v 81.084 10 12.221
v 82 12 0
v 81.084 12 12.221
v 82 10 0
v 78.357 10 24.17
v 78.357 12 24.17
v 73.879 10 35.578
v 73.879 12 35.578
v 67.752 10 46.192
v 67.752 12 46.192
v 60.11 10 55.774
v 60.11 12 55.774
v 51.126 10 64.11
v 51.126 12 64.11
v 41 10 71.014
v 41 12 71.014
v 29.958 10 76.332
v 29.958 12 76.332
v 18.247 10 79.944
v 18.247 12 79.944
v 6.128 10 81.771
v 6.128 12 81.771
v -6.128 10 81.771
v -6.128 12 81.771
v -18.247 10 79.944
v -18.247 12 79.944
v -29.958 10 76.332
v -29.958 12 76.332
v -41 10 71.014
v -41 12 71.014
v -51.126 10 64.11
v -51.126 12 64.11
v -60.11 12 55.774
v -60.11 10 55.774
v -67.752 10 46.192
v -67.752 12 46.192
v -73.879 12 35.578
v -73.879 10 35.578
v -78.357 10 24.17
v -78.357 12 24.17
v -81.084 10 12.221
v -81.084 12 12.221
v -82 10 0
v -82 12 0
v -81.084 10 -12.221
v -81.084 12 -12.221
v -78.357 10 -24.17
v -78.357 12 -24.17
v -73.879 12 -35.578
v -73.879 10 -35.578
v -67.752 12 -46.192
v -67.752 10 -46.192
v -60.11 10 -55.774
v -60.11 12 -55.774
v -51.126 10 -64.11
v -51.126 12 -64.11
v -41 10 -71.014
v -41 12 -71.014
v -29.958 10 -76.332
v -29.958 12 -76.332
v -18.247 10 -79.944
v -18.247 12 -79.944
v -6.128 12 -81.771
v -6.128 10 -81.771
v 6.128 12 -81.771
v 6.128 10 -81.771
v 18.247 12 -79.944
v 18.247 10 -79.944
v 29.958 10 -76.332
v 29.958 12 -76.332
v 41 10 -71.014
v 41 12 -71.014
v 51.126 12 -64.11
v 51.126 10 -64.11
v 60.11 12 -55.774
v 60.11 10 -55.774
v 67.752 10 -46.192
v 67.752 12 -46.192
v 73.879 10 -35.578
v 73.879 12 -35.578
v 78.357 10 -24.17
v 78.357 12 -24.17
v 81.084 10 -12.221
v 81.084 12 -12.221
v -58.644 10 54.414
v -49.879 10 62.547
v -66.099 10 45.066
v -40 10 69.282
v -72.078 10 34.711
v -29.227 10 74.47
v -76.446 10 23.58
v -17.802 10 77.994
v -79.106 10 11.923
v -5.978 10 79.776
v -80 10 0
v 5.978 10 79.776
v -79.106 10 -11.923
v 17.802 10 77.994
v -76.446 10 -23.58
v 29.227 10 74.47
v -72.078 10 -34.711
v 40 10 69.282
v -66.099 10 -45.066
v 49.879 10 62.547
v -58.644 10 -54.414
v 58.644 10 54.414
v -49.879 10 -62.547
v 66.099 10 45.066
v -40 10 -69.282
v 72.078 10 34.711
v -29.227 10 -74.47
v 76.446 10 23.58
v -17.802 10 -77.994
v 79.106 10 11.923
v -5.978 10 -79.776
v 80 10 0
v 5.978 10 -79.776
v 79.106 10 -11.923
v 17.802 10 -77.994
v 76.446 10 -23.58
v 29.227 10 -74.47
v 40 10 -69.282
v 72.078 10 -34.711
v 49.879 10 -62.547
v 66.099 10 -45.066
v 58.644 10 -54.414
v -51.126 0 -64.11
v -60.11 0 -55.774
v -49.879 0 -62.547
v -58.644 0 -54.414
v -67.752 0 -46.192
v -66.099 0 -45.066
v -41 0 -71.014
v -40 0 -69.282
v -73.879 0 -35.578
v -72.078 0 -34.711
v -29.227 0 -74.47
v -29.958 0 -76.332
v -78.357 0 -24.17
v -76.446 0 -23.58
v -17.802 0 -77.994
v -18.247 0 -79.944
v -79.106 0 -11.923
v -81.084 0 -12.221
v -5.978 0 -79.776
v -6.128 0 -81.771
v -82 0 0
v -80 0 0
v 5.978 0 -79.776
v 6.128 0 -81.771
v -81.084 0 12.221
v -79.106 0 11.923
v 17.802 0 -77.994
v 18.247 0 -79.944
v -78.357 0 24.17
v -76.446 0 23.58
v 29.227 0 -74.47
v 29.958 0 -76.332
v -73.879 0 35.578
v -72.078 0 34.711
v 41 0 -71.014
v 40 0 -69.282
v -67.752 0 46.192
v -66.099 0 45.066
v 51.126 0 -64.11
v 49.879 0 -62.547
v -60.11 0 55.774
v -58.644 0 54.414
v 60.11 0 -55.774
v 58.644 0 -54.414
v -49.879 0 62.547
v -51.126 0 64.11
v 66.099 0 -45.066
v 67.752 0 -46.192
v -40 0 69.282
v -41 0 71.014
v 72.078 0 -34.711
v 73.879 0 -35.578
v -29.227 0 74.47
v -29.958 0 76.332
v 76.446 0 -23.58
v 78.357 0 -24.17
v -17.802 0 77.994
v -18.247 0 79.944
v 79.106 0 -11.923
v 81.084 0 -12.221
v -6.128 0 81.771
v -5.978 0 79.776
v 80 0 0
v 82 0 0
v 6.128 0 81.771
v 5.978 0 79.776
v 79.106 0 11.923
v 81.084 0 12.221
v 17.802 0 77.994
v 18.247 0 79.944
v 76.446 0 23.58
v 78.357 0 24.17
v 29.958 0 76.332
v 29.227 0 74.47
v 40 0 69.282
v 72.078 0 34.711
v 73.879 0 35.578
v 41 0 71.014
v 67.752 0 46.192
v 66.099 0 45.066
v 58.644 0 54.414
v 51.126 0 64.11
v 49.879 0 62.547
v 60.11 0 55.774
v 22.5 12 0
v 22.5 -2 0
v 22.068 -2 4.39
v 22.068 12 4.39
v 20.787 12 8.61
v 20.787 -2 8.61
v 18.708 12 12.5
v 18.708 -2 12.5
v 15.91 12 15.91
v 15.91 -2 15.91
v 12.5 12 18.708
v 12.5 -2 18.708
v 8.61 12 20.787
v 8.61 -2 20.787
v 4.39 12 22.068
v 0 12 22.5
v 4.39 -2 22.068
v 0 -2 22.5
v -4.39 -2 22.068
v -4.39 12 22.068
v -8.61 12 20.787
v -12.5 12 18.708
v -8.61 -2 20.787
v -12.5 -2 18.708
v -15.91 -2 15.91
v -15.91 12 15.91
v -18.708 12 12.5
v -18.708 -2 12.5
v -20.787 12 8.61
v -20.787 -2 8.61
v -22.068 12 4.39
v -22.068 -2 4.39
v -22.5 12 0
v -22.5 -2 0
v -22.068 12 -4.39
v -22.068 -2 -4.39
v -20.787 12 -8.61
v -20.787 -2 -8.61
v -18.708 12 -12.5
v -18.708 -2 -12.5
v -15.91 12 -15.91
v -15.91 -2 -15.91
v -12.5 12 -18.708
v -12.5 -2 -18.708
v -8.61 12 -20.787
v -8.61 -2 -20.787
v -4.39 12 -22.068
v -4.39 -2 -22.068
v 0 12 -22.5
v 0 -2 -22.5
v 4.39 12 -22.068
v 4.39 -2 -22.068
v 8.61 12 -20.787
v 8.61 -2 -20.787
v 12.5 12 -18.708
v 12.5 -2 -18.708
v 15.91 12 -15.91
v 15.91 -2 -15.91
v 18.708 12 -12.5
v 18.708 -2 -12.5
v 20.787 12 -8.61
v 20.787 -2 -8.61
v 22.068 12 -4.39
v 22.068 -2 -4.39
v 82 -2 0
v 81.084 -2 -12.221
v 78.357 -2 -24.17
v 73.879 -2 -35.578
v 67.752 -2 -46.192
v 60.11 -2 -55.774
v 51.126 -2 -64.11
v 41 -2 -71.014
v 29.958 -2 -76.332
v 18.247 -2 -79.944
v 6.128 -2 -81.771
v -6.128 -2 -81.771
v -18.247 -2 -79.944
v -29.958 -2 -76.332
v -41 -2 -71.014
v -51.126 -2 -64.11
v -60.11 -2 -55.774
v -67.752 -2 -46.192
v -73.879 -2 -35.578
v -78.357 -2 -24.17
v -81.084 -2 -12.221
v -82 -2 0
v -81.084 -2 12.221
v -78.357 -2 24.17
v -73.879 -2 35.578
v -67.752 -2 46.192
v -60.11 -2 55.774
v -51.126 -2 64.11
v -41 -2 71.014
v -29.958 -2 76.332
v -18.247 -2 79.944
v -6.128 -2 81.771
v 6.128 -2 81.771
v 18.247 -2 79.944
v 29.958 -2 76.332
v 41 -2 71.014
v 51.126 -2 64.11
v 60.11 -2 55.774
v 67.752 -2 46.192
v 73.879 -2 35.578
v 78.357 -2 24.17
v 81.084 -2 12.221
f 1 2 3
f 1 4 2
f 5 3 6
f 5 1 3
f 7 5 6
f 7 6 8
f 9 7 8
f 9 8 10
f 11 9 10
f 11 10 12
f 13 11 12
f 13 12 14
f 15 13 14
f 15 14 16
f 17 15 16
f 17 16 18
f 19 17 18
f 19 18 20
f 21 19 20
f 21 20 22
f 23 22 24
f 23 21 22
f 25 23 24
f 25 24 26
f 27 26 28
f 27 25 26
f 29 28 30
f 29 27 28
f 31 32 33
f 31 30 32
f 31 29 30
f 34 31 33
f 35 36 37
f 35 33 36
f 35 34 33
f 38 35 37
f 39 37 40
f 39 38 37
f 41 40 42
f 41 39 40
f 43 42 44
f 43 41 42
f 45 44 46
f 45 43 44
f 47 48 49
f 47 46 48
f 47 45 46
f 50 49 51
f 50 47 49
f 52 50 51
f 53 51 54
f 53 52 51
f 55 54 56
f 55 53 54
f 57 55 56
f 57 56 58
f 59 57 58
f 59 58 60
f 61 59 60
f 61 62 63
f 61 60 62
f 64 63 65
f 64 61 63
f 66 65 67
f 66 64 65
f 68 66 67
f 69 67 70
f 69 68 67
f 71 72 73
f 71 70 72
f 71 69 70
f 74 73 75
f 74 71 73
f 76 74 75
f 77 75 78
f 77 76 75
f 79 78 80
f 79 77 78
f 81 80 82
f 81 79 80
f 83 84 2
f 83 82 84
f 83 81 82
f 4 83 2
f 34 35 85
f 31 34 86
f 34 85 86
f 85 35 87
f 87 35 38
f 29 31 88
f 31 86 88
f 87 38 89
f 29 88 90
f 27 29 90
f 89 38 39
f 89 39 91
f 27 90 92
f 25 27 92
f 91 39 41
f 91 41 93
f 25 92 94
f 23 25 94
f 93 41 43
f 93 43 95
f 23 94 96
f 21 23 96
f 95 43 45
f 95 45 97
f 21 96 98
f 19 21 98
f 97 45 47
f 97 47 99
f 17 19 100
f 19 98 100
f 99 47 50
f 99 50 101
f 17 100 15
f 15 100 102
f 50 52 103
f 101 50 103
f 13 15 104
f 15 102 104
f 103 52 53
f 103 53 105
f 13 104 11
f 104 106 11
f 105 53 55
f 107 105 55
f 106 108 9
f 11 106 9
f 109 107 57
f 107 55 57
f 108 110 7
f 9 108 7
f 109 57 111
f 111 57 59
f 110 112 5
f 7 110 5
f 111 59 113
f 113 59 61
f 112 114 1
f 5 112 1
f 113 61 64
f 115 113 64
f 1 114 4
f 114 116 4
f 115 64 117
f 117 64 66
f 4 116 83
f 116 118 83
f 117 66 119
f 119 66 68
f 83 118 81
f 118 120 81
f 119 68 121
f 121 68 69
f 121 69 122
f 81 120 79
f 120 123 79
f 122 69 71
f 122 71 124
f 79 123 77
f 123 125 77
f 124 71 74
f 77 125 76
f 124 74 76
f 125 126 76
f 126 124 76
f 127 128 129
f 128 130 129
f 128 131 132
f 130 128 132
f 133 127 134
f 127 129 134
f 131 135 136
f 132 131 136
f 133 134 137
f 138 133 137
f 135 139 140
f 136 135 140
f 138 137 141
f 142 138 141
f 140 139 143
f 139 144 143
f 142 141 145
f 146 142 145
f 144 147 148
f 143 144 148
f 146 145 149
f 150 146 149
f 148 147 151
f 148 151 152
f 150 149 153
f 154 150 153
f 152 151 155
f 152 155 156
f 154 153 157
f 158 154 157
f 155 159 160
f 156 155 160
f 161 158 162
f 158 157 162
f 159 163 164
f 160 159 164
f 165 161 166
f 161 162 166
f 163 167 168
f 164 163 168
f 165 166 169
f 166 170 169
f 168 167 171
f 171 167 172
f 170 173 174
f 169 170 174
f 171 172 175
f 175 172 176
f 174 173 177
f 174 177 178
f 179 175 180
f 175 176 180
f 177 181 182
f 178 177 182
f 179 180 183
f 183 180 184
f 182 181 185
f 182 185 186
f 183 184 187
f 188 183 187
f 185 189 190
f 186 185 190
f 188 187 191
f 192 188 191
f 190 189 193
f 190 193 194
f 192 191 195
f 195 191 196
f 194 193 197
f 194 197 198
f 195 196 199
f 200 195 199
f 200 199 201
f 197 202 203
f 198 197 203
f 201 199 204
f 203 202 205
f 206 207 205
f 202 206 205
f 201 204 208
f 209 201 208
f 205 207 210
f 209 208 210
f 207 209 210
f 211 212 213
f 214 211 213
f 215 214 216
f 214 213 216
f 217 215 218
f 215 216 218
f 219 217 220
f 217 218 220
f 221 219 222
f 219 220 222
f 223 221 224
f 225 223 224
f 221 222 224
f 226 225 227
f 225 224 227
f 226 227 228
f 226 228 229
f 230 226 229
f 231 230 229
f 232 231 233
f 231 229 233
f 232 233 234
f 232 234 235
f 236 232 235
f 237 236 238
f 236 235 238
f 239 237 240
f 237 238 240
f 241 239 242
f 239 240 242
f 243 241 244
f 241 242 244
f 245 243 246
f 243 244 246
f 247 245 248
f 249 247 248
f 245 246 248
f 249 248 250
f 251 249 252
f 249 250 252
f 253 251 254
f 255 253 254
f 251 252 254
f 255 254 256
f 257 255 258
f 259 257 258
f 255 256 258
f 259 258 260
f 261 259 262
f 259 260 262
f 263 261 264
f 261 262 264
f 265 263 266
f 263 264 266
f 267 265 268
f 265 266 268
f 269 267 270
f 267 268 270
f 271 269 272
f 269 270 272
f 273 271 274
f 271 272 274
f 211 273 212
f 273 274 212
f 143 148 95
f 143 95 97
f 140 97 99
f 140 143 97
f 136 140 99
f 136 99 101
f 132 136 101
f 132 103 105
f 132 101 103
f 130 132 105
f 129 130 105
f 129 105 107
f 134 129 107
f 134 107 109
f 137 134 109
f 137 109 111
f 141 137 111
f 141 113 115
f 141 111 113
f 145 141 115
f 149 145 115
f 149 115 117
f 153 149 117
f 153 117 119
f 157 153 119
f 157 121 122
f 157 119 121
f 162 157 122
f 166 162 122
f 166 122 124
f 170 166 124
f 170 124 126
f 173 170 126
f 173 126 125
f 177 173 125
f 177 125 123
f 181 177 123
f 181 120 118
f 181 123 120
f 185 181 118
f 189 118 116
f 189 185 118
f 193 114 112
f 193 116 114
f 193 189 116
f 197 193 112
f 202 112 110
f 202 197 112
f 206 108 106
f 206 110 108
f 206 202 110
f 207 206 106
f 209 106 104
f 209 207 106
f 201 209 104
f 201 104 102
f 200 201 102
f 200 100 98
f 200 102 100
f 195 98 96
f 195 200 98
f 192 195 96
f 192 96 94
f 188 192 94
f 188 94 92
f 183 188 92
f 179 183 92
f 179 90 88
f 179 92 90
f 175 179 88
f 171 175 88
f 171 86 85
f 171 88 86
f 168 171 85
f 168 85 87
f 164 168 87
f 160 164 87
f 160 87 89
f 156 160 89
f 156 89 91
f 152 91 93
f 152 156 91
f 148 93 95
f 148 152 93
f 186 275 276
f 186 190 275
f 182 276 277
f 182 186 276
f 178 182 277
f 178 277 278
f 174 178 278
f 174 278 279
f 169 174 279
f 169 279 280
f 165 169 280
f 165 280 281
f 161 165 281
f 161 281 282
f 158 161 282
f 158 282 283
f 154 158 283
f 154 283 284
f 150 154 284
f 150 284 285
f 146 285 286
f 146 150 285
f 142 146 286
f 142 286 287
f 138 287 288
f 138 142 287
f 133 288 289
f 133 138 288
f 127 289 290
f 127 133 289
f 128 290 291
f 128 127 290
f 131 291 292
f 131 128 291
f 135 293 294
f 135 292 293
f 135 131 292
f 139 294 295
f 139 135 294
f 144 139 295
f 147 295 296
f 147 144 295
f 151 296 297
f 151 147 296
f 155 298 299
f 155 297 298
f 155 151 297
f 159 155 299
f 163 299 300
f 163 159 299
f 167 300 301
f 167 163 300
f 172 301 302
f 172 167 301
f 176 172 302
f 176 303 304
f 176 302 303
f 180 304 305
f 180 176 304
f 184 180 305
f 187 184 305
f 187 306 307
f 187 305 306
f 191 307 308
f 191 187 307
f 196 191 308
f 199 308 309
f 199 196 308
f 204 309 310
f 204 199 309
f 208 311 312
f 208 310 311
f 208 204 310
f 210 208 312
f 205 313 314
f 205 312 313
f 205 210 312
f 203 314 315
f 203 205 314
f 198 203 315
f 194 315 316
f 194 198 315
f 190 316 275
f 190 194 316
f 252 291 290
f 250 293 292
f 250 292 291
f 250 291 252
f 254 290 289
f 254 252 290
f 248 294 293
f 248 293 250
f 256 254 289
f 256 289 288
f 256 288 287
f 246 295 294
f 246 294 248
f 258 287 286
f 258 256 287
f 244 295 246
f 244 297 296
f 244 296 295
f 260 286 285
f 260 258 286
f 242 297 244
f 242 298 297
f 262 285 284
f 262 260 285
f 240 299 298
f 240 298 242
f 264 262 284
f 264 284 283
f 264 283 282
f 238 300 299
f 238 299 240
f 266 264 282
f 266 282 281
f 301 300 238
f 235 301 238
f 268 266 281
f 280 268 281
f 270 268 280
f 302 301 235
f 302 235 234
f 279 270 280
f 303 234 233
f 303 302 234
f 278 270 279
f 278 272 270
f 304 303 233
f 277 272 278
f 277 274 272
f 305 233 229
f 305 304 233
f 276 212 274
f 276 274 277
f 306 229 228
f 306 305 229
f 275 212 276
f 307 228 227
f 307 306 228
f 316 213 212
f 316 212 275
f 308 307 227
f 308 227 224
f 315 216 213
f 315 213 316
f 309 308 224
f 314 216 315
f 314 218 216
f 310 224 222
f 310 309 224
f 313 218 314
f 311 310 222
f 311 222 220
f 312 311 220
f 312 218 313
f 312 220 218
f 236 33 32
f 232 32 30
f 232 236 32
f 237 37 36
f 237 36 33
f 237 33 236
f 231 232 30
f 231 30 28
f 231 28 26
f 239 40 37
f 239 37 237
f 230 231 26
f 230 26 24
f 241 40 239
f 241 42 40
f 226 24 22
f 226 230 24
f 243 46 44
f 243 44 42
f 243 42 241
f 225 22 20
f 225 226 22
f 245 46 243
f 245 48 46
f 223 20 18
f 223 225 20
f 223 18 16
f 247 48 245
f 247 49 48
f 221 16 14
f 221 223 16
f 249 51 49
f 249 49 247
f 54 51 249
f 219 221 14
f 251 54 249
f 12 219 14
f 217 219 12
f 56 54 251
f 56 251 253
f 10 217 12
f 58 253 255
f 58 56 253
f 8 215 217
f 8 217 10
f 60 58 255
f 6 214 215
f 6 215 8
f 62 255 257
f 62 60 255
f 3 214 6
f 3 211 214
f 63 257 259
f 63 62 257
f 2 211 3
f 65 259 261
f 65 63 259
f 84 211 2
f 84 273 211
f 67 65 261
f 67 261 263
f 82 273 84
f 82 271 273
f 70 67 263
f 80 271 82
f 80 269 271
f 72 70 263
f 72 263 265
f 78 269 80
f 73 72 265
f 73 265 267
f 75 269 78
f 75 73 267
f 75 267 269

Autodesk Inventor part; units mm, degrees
ref_plane "YZ Plane" through (0, 0, 0) normal (1, 0, 0) x (0, 1, 0)
ref_plane "XZ Plane" through (0, 0, 0) normal (0, 1, 0) x (-1, 0, 0)
ref_plane "XY Plane" through (0, 0, 0) normal (0, 0, 1) x (1, 0, 0)
sketch "Skizze1" plane through (0, 0, 0) normal (0, 1, 0) x (-1, 0, 0)
  circle A0 centre (0, 0) radius 80
  dimension "d0" = 160
extrude "Extrusion1" add sketch "Skizze1" along normal blind 10
sketch "Skizze2" plane through (0, 10, 0) normal (0, 1, 0) x (1, 0, 0)
  circle A0 centre (0, 0) radius 82
  dimension "d3" = 164
extrude "Extrusion2" add sketch "Skizze2" along normal blind 2
sketch "Skizze3" plane through (0, 0, 0) normal (0, -1, 0) x (1, 0, 0)
  circle A0 centre (0, 0) radius 82
  dimension "d6" = 164
extrude "Extrusion3" add sketch "Skizze3" along normal blind 2
sketch "Skizze4" plane through (0, -2, 0) normal (0, -1, 0) x (1, 0, 0)
  circle A0 centre (0, 0) radius 22.5
  dimension "d9" = 45
extrude "Extrusion4" cut sketch "Skizze4" against normal blind 14
properties part number "Antriebsscheibe"
